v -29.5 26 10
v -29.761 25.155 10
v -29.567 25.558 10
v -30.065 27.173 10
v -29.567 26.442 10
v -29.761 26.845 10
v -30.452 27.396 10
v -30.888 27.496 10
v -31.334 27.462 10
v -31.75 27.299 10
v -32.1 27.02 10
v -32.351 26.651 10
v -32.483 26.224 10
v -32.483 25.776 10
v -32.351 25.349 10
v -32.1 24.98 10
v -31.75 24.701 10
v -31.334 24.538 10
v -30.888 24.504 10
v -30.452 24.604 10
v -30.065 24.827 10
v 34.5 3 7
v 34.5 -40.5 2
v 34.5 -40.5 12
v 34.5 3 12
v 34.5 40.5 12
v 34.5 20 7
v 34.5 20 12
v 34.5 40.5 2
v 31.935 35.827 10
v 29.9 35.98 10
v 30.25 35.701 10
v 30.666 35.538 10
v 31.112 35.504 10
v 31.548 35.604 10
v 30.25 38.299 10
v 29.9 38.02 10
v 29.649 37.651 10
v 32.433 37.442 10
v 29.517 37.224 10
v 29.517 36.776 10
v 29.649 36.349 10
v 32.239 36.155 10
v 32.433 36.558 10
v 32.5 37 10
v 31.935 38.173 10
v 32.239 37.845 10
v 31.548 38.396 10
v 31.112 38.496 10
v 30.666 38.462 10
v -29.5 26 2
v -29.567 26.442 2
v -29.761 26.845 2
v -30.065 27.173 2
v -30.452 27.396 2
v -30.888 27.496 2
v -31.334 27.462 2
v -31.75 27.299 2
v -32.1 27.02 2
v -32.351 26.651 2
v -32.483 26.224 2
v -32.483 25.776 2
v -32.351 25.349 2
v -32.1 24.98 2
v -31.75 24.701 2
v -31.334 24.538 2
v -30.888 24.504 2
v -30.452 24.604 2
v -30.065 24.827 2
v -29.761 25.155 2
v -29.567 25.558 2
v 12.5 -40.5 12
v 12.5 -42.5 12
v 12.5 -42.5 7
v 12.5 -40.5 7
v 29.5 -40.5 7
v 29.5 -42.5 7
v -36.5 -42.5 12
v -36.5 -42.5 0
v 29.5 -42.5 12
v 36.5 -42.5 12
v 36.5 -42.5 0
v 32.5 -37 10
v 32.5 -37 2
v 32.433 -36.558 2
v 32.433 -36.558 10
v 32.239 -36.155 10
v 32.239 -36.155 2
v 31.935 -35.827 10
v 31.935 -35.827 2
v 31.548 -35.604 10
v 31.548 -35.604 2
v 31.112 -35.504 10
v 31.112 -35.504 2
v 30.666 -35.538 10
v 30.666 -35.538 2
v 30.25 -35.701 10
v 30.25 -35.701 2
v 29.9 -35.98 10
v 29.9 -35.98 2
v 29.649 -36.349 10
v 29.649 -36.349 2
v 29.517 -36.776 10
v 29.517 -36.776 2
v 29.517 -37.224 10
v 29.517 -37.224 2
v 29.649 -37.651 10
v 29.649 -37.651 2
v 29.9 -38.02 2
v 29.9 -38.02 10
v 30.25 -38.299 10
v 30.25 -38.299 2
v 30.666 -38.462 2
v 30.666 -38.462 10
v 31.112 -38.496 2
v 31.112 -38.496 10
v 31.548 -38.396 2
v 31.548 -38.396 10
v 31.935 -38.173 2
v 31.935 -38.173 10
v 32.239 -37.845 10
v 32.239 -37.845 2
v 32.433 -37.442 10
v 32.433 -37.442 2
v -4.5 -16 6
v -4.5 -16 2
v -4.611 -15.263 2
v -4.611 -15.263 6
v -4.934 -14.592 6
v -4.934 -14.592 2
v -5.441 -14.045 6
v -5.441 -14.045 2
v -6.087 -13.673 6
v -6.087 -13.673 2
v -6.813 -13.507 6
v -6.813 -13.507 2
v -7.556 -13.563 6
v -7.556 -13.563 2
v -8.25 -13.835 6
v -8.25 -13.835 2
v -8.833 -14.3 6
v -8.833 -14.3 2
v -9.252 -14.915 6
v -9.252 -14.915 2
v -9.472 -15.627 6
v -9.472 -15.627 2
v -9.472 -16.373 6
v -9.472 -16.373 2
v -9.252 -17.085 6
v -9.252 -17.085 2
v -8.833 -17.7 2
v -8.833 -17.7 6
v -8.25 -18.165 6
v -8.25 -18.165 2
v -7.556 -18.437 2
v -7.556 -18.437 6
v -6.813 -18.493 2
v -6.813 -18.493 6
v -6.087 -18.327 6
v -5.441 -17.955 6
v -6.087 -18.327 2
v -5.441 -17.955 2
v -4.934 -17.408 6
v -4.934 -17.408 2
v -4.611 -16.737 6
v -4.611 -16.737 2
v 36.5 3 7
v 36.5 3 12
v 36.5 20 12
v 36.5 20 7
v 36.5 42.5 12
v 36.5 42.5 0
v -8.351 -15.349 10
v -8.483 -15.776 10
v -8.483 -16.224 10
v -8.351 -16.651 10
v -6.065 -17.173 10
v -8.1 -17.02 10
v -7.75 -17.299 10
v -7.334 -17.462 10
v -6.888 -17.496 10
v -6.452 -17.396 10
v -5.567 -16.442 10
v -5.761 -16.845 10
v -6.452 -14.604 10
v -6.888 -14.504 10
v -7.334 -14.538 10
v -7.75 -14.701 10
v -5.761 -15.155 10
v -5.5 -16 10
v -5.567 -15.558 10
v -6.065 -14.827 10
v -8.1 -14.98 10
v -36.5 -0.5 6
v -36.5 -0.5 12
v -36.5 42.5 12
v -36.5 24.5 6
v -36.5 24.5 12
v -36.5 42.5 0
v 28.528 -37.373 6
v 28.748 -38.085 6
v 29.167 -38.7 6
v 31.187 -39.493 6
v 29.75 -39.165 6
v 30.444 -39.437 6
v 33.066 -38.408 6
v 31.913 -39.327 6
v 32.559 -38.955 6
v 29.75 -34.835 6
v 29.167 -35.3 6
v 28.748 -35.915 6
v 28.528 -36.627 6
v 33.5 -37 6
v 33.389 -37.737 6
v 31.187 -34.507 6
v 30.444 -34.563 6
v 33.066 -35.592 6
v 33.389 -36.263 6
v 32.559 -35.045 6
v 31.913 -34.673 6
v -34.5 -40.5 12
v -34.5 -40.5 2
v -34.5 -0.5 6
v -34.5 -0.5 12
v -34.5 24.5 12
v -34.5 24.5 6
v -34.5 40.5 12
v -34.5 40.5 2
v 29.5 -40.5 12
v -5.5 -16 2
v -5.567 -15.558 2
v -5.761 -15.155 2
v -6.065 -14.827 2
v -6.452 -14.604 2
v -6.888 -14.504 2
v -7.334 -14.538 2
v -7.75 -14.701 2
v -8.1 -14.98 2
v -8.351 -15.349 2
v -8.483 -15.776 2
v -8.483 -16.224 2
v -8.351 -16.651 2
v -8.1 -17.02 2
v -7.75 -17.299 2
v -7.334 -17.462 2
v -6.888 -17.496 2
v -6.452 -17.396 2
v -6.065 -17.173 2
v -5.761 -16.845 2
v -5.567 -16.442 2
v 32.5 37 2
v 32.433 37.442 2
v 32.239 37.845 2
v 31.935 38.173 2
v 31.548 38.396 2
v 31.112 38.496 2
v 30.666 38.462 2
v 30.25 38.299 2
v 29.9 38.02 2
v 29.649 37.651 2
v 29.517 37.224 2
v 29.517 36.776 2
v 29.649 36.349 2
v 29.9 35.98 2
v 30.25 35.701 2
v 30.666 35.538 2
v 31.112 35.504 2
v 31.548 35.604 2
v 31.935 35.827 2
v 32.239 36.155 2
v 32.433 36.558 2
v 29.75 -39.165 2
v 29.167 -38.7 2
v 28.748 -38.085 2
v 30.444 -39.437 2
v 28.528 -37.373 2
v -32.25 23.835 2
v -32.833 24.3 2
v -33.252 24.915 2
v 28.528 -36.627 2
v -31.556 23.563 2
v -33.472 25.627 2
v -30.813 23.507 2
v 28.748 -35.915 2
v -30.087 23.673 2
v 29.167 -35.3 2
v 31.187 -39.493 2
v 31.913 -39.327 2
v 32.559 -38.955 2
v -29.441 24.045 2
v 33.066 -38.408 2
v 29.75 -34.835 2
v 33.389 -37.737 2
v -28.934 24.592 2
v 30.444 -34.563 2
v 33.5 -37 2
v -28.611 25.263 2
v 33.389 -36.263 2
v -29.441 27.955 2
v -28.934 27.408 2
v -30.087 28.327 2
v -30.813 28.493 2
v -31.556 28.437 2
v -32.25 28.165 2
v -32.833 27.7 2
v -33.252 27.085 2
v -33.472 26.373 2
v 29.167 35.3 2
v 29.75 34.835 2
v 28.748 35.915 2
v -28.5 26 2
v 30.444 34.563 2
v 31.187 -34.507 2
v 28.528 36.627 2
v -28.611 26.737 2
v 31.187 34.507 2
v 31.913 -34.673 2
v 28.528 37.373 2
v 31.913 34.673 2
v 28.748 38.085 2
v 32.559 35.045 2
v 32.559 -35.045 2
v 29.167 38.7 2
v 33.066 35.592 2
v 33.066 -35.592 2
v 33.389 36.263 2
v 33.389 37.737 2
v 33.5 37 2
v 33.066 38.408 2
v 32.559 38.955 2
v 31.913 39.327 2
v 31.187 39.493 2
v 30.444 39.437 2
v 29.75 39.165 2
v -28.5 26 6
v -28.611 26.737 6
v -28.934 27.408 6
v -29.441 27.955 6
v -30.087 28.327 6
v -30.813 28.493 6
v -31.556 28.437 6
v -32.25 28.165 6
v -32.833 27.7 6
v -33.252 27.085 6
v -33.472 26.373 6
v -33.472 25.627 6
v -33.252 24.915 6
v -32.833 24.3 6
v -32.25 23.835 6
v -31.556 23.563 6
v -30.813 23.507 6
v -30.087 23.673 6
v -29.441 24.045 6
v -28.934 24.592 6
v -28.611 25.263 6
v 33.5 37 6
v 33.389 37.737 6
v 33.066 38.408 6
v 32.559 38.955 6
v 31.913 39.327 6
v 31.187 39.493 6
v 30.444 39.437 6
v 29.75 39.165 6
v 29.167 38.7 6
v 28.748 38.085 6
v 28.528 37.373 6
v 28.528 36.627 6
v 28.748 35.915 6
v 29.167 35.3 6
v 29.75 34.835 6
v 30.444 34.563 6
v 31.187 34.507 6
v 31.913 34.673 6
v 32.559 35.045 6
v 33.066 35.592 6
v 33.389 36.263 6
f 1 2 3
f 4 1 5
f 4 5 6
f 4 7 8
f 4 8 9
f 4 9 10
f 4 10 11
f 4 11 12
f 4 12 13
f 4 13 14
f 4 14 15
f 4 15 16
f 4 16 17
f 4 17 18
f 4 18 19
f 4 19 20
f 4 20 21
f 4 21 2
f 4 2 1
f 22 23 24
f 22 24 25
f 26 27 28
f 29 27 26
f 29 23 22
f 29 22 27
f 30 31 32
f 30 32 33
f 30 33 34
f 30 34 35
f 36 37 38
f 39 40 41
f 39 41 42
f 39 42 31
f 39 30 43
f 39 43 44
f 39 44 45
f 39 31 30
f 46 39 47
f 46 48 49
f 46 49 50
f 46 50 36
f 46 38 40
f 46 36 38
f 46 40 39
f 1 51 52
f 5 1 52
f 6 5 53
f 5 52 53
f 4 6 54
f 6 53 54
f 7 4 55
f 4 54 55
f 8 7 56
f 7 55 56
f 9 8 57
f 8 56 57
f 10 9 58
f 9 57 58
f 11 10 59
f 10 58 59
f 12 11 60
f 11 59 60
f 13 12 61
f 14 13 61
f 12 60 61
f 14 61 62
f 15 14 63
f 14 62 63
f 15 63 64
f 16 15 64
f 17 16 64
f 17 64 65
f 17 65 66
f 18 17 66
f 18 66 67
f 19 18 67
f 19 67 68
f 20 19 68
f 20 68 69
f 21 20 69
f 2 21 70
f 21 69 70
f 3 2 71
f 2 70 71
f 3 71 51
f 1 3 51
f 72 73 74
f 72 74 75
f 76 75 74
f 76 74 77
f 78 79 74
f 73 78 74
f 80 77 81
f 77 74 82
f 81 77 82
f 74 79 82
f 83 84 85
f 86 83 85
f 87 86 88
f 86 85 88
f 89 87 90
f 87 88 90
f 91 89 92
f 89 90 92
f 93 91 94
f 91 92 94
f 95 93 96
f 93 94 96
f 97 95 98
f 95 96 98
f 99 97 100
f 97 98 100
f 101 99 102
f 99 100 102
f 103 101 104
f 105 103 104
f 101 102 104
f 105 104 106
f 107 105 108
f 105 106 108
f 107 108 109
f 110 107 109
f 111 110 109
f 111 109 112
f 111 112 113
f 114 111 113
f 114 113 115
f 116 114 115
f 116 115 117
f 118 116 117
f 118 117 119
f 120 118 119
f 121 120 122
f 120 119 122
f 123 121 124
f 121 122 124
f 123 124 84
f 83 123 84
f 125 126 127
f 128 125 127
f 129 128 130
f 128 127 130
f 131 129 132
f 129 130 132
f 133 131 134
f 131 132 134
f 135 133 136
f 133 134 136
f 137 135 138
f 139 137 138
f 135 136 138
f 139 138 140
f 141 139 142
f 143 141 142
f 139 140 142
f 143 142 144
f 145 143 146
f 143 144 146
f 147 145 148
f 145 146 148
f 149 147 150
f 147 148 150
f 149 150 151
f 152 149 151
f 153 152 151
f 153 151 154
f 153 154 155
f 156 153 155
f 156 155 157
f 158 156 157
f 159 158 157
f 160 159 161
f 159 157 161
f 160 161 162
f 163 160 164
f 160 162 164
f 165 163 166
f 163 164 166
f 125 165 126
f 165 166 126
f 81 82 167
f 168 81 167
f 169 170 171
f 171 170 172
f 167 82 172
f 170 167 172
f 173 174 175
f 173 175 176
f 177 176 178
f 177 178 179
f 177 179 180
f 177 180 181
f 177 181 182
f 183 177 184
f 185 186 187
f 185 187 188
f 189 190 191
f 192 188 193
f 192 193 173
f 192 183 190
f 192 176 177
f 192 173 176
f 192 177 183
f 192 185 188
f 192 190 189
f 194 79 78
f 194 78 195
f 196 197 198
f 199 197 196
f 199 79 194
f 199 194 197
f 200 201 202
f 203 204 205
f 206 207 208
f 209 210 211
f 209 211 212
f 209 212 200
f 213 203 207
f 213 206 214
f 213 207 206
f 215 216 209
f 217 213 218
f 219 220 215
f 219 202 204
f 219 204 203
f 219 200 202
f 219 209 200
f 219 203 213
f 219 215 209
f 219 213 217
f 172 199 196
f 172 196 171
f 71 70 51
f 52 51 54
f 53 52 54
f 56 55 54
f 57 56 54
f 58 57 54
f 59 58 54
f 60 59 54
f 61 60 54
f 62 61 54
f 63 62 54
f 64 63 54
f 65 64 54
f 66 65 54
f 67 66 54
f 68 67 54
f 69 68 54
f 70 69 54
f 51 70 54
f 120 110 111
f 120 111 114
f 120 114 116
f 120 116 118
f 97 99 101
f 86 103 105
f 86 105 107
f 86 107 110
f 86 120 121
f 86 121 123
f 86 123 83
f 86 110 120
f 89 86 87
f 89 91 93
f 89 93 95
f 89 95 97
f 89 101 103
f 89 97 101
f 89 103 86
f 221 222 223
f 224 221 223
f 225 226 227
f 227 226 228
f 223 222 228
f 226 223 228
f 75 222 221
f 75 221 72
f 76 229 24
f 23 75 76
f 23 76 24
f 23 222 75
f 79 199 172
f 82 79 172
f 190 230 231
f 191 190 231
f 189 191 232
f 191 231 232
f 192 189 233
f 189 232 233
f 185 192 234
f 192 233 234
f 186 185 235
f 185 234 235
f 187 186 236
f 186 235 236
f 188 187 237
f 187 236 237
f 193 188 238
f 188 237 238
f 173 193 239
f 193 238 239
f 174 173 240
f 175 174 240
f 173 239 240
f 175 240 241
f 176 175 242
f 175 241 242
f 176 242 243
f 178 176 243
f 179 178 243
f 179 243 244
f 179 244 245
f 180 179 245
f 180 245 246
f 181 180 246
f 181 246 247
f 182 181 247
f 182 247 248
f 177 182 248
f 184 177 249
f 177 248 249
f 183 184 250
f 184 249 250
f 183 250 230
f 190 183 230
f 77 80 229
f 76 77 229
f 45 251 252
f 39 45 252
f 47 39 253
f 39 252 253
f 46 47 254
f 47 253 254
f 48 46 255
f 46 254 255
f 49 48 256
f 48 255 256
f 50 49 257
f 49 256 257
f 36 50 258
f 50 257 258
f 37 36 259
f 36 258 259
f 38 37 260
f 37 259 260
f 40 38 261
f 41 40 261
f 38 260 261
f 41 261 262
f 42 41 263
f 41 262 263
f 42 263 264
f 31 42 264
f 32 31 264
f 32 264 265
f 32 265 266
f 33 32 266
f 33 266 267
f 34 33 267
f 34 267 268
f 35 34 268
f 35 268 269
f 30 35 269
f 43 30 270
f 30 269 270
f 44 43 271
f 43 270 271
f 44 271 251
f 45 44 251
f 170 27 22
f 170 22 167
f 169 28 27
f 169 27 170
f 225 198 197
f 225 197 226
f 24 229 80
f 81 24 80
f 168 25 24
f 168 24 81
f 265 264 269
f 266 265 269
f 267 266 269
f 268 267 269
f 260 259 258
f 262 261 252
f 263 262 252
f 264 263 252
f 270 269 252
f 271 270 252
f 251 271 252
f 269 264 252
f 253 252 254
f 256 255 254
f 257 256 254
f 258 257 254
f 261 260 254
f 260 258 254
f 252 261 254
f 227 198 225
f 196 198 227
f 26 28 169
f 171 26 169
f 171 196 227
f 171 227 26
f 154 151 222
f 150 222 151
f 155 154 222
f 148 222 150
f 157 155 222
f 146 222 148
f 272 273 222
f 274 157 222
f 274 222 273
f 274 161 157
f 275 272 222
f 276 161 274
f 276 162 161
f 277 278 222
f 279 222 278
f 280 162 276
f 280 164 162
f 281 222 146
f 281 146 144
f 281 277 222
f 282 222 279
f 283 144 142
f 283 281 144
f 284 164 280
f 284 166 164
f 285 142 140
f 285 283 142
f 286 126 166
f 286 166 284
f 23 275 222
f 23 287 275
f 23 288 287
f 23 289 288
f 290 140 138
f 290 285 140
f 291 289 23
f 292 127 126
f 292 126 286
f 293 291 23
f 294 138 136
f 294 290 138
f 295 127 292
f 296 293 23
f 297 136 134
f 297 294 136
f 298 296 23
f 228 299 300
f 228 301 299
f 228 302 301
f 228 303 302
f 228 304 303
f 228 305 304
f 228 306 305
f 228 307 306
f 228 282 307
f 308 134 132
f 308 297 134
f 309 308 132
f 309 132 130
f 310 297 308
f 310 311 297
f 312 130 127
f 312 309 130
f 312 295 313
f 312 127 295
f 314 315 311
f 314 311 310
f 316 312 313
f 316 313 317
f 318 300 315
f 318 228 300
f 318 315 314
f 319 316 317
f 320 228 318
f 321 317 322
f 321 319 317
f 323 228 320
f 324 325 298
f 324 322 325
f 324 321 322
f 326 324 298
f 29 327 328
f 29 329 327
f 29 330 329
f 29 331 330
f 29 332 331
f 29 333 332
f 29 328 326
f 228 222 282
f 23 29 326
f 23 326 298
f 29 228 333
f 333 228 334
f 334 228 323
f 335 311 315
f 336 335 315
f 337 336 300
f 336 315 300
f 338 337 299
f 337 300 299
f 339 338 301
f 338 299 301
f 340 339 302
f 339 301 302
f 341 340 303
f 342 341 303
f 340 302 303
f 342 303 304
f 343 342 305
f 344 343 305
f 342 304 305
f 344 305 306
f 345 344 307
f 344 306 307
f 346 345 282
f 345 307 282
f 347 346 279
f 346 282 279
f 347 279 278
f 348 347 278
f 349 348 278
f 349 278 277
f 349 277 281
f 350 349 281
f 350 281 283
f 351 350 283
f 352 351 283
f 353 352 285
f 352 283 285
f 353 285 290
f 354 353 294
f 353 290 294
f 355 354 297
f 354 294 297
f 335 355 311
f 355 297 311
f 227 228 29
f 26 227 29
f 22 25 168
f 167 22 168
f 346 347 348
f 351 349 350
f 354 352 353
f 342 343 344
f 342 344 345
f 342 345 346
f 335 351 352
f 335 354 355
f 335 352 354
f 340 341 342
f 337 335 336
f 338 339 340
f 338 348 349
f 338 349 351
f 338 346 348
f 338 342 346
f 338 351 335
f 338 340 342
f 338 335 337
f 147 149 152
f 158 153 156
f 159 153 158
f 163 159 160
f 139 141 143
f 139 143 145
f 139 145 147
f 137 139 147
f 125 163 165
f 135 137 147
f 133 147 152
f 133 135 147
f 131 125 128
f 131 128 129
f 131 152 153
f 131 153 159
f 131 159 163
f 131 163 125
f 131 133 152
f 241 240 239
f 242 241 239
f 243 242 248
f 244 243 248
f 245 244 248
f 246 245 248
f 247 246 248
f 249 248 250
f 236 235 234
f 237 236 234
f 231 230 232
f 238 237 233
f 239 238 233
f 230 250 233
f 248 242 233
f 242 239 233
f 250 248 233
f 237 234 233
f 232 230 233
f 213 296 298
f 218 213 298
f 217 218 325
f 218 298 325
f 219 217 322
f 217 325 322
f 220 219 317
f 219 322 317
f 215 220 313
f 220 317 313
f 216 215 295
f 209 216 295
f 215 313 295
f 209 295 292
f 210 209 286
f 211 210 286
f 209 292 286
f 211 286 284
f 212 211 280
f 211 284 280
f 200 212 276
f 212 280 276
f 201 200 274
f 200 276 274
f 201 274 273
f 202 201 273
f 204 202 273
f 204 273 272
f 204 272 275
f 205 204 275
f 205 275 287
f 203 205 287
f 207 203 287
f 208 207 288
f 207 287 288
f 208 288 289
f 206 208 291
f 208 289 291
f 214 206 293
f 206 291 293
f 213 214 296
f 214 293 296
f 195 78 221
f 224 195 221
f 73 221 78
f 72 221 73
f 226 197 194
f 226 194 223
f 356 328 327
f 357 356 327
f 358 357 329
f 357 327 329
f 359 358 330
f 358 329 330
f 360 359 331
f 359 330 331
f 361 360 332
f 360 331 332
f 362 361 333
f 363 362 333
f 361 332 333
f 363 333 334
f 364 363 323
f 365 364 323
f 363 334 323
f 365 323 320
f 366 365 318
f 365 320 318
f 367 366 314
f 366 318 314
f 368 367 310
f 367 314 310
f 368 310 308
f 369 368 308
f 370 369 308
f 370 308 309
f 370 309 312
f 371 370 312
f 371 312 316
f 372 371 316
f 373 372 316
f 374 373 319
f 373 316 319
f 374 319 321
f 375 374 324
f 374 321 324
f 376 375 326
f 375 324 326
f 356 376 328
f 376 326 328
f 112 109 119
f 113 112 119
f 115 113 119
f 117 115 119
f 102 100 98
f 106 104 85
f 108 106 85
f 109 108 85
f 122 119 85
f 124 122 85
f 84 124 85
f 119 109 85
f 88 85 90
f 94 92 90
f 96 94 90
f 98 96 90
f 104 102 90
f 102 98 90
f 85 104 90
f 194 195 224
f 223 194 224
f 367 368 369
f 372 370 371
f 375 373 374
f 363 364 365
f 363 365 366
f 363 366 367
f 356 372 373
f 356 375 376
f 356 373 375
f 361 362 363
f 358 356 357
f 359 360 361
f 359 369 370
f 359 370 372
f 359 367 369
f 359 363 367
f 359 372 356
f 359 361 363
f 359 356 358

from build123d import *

# Parameters (mm, degrees)
SKETCH008_R     = 1.5
PAD003_DEPTH    = 8
SKETCH_W        = 73
SKETCH_H        = 85
PAD_DEPTH       = 2
SKETCH001_W     = 73
SKETCH001_H     = 85
SKETCH001_W_2   = 69
SKETCH001_H_2   = 81
PAD001_DEPTH    = 10
SKETCH003_W     = 2
SKETCH003_H     = 25
POCKET_DEPTH    = 6
SKETCH004_R     = 2.5
PAD002_DEPTH    = 4
SKETCH009_W     = 3
SKETCH009_H     = 17
POCKET001_DEPTH = 5
SKETCH010_W     = 17
SKETCH010_H     = 2
POCKET002_DEPTH = 5


with BuildPart() as pad003:
    # Sketch008 → Pad003 (new body)
    with BuildSketch(Plane.XY.offset(2)):
        with Locations((-31, 26)):
            Circle(SKETCH008_R)
        with Locations((31, 37)):
            Circle(SKETCH008_R)
        with Locations((31, -37)):
            Circle(SKETCH008_R)
        with Locations((-7, -16)):
            Circle(SKETCH008_R)
    extrude(amount=PAD003_DEPTH)


with BuildPart() as pocket002:
    # Sketch → Pad (new body)
    with BuildSketch(Plane.XY):
        Rectangle(SKETCH_W, SKETCH_H)
    extrude(amount=PAD_DEPTH)

    # Sketch001 → Pad001 (new body)
    with BuildSketch(Plane.XY.offset(2)):
        Rectangle(SKETCH001_W, SKETCH001_H)
        Rectangle(SKETCH001_W_2, SKETCH001_H_2, mode=Mode.SUBTRACT)
    extrude(amount=PAD001_DEPTH)

    # Sketch003 → Pocket (cut)
    with BuildSketch(Plane.XY.offset(12)):
        with Locations((-35.5, 12)):
            Rectangle(SKETCH003_W, SKETCH003_H)
    extrude(amount=-POCKET_DEPTH, mode=Mode.SUBTRACT)

    # Sketch004 → Pad002 (new body)
    with BuildSketch(Plane.XY.offset(2)):
        with Locations((-31, 26)):
            Circle(SKETCH004_R)
        with Locations((31, 37)):
            Circle(SKETCH004_R)
        with Locations((31, -37)):
            Circle(SKETCH004_R)
        with Locations((-7, -16)):
            Circle(SKETCH004_R)
    extrude(amount=PAD002_DEPTH)

    # Sketch009 → Pocket001 (cut)
    with BuildSketch(Plane.XY.offset(12)):
        with Locations((35.5, 11.5)):
            Rectangle(SKETCH009_W, SKETCH009_H)
    extrude(amount=-POCKET001_DEPTH, mode=Mode.SUBTRACT)

    # Sketch010 → Pocket002 (cut)
    with BuildSketch(Plane.XY.offset(12)):
        with Locations((21, -41.5)):
            Rectangle(SKETCH010_W, SKETCH010_H)
    extrude(amount=-POCKET002_DEPTH, mode=Mode.SUBTRACT)


solid = Compound([pad003.part, pocket002.part])
